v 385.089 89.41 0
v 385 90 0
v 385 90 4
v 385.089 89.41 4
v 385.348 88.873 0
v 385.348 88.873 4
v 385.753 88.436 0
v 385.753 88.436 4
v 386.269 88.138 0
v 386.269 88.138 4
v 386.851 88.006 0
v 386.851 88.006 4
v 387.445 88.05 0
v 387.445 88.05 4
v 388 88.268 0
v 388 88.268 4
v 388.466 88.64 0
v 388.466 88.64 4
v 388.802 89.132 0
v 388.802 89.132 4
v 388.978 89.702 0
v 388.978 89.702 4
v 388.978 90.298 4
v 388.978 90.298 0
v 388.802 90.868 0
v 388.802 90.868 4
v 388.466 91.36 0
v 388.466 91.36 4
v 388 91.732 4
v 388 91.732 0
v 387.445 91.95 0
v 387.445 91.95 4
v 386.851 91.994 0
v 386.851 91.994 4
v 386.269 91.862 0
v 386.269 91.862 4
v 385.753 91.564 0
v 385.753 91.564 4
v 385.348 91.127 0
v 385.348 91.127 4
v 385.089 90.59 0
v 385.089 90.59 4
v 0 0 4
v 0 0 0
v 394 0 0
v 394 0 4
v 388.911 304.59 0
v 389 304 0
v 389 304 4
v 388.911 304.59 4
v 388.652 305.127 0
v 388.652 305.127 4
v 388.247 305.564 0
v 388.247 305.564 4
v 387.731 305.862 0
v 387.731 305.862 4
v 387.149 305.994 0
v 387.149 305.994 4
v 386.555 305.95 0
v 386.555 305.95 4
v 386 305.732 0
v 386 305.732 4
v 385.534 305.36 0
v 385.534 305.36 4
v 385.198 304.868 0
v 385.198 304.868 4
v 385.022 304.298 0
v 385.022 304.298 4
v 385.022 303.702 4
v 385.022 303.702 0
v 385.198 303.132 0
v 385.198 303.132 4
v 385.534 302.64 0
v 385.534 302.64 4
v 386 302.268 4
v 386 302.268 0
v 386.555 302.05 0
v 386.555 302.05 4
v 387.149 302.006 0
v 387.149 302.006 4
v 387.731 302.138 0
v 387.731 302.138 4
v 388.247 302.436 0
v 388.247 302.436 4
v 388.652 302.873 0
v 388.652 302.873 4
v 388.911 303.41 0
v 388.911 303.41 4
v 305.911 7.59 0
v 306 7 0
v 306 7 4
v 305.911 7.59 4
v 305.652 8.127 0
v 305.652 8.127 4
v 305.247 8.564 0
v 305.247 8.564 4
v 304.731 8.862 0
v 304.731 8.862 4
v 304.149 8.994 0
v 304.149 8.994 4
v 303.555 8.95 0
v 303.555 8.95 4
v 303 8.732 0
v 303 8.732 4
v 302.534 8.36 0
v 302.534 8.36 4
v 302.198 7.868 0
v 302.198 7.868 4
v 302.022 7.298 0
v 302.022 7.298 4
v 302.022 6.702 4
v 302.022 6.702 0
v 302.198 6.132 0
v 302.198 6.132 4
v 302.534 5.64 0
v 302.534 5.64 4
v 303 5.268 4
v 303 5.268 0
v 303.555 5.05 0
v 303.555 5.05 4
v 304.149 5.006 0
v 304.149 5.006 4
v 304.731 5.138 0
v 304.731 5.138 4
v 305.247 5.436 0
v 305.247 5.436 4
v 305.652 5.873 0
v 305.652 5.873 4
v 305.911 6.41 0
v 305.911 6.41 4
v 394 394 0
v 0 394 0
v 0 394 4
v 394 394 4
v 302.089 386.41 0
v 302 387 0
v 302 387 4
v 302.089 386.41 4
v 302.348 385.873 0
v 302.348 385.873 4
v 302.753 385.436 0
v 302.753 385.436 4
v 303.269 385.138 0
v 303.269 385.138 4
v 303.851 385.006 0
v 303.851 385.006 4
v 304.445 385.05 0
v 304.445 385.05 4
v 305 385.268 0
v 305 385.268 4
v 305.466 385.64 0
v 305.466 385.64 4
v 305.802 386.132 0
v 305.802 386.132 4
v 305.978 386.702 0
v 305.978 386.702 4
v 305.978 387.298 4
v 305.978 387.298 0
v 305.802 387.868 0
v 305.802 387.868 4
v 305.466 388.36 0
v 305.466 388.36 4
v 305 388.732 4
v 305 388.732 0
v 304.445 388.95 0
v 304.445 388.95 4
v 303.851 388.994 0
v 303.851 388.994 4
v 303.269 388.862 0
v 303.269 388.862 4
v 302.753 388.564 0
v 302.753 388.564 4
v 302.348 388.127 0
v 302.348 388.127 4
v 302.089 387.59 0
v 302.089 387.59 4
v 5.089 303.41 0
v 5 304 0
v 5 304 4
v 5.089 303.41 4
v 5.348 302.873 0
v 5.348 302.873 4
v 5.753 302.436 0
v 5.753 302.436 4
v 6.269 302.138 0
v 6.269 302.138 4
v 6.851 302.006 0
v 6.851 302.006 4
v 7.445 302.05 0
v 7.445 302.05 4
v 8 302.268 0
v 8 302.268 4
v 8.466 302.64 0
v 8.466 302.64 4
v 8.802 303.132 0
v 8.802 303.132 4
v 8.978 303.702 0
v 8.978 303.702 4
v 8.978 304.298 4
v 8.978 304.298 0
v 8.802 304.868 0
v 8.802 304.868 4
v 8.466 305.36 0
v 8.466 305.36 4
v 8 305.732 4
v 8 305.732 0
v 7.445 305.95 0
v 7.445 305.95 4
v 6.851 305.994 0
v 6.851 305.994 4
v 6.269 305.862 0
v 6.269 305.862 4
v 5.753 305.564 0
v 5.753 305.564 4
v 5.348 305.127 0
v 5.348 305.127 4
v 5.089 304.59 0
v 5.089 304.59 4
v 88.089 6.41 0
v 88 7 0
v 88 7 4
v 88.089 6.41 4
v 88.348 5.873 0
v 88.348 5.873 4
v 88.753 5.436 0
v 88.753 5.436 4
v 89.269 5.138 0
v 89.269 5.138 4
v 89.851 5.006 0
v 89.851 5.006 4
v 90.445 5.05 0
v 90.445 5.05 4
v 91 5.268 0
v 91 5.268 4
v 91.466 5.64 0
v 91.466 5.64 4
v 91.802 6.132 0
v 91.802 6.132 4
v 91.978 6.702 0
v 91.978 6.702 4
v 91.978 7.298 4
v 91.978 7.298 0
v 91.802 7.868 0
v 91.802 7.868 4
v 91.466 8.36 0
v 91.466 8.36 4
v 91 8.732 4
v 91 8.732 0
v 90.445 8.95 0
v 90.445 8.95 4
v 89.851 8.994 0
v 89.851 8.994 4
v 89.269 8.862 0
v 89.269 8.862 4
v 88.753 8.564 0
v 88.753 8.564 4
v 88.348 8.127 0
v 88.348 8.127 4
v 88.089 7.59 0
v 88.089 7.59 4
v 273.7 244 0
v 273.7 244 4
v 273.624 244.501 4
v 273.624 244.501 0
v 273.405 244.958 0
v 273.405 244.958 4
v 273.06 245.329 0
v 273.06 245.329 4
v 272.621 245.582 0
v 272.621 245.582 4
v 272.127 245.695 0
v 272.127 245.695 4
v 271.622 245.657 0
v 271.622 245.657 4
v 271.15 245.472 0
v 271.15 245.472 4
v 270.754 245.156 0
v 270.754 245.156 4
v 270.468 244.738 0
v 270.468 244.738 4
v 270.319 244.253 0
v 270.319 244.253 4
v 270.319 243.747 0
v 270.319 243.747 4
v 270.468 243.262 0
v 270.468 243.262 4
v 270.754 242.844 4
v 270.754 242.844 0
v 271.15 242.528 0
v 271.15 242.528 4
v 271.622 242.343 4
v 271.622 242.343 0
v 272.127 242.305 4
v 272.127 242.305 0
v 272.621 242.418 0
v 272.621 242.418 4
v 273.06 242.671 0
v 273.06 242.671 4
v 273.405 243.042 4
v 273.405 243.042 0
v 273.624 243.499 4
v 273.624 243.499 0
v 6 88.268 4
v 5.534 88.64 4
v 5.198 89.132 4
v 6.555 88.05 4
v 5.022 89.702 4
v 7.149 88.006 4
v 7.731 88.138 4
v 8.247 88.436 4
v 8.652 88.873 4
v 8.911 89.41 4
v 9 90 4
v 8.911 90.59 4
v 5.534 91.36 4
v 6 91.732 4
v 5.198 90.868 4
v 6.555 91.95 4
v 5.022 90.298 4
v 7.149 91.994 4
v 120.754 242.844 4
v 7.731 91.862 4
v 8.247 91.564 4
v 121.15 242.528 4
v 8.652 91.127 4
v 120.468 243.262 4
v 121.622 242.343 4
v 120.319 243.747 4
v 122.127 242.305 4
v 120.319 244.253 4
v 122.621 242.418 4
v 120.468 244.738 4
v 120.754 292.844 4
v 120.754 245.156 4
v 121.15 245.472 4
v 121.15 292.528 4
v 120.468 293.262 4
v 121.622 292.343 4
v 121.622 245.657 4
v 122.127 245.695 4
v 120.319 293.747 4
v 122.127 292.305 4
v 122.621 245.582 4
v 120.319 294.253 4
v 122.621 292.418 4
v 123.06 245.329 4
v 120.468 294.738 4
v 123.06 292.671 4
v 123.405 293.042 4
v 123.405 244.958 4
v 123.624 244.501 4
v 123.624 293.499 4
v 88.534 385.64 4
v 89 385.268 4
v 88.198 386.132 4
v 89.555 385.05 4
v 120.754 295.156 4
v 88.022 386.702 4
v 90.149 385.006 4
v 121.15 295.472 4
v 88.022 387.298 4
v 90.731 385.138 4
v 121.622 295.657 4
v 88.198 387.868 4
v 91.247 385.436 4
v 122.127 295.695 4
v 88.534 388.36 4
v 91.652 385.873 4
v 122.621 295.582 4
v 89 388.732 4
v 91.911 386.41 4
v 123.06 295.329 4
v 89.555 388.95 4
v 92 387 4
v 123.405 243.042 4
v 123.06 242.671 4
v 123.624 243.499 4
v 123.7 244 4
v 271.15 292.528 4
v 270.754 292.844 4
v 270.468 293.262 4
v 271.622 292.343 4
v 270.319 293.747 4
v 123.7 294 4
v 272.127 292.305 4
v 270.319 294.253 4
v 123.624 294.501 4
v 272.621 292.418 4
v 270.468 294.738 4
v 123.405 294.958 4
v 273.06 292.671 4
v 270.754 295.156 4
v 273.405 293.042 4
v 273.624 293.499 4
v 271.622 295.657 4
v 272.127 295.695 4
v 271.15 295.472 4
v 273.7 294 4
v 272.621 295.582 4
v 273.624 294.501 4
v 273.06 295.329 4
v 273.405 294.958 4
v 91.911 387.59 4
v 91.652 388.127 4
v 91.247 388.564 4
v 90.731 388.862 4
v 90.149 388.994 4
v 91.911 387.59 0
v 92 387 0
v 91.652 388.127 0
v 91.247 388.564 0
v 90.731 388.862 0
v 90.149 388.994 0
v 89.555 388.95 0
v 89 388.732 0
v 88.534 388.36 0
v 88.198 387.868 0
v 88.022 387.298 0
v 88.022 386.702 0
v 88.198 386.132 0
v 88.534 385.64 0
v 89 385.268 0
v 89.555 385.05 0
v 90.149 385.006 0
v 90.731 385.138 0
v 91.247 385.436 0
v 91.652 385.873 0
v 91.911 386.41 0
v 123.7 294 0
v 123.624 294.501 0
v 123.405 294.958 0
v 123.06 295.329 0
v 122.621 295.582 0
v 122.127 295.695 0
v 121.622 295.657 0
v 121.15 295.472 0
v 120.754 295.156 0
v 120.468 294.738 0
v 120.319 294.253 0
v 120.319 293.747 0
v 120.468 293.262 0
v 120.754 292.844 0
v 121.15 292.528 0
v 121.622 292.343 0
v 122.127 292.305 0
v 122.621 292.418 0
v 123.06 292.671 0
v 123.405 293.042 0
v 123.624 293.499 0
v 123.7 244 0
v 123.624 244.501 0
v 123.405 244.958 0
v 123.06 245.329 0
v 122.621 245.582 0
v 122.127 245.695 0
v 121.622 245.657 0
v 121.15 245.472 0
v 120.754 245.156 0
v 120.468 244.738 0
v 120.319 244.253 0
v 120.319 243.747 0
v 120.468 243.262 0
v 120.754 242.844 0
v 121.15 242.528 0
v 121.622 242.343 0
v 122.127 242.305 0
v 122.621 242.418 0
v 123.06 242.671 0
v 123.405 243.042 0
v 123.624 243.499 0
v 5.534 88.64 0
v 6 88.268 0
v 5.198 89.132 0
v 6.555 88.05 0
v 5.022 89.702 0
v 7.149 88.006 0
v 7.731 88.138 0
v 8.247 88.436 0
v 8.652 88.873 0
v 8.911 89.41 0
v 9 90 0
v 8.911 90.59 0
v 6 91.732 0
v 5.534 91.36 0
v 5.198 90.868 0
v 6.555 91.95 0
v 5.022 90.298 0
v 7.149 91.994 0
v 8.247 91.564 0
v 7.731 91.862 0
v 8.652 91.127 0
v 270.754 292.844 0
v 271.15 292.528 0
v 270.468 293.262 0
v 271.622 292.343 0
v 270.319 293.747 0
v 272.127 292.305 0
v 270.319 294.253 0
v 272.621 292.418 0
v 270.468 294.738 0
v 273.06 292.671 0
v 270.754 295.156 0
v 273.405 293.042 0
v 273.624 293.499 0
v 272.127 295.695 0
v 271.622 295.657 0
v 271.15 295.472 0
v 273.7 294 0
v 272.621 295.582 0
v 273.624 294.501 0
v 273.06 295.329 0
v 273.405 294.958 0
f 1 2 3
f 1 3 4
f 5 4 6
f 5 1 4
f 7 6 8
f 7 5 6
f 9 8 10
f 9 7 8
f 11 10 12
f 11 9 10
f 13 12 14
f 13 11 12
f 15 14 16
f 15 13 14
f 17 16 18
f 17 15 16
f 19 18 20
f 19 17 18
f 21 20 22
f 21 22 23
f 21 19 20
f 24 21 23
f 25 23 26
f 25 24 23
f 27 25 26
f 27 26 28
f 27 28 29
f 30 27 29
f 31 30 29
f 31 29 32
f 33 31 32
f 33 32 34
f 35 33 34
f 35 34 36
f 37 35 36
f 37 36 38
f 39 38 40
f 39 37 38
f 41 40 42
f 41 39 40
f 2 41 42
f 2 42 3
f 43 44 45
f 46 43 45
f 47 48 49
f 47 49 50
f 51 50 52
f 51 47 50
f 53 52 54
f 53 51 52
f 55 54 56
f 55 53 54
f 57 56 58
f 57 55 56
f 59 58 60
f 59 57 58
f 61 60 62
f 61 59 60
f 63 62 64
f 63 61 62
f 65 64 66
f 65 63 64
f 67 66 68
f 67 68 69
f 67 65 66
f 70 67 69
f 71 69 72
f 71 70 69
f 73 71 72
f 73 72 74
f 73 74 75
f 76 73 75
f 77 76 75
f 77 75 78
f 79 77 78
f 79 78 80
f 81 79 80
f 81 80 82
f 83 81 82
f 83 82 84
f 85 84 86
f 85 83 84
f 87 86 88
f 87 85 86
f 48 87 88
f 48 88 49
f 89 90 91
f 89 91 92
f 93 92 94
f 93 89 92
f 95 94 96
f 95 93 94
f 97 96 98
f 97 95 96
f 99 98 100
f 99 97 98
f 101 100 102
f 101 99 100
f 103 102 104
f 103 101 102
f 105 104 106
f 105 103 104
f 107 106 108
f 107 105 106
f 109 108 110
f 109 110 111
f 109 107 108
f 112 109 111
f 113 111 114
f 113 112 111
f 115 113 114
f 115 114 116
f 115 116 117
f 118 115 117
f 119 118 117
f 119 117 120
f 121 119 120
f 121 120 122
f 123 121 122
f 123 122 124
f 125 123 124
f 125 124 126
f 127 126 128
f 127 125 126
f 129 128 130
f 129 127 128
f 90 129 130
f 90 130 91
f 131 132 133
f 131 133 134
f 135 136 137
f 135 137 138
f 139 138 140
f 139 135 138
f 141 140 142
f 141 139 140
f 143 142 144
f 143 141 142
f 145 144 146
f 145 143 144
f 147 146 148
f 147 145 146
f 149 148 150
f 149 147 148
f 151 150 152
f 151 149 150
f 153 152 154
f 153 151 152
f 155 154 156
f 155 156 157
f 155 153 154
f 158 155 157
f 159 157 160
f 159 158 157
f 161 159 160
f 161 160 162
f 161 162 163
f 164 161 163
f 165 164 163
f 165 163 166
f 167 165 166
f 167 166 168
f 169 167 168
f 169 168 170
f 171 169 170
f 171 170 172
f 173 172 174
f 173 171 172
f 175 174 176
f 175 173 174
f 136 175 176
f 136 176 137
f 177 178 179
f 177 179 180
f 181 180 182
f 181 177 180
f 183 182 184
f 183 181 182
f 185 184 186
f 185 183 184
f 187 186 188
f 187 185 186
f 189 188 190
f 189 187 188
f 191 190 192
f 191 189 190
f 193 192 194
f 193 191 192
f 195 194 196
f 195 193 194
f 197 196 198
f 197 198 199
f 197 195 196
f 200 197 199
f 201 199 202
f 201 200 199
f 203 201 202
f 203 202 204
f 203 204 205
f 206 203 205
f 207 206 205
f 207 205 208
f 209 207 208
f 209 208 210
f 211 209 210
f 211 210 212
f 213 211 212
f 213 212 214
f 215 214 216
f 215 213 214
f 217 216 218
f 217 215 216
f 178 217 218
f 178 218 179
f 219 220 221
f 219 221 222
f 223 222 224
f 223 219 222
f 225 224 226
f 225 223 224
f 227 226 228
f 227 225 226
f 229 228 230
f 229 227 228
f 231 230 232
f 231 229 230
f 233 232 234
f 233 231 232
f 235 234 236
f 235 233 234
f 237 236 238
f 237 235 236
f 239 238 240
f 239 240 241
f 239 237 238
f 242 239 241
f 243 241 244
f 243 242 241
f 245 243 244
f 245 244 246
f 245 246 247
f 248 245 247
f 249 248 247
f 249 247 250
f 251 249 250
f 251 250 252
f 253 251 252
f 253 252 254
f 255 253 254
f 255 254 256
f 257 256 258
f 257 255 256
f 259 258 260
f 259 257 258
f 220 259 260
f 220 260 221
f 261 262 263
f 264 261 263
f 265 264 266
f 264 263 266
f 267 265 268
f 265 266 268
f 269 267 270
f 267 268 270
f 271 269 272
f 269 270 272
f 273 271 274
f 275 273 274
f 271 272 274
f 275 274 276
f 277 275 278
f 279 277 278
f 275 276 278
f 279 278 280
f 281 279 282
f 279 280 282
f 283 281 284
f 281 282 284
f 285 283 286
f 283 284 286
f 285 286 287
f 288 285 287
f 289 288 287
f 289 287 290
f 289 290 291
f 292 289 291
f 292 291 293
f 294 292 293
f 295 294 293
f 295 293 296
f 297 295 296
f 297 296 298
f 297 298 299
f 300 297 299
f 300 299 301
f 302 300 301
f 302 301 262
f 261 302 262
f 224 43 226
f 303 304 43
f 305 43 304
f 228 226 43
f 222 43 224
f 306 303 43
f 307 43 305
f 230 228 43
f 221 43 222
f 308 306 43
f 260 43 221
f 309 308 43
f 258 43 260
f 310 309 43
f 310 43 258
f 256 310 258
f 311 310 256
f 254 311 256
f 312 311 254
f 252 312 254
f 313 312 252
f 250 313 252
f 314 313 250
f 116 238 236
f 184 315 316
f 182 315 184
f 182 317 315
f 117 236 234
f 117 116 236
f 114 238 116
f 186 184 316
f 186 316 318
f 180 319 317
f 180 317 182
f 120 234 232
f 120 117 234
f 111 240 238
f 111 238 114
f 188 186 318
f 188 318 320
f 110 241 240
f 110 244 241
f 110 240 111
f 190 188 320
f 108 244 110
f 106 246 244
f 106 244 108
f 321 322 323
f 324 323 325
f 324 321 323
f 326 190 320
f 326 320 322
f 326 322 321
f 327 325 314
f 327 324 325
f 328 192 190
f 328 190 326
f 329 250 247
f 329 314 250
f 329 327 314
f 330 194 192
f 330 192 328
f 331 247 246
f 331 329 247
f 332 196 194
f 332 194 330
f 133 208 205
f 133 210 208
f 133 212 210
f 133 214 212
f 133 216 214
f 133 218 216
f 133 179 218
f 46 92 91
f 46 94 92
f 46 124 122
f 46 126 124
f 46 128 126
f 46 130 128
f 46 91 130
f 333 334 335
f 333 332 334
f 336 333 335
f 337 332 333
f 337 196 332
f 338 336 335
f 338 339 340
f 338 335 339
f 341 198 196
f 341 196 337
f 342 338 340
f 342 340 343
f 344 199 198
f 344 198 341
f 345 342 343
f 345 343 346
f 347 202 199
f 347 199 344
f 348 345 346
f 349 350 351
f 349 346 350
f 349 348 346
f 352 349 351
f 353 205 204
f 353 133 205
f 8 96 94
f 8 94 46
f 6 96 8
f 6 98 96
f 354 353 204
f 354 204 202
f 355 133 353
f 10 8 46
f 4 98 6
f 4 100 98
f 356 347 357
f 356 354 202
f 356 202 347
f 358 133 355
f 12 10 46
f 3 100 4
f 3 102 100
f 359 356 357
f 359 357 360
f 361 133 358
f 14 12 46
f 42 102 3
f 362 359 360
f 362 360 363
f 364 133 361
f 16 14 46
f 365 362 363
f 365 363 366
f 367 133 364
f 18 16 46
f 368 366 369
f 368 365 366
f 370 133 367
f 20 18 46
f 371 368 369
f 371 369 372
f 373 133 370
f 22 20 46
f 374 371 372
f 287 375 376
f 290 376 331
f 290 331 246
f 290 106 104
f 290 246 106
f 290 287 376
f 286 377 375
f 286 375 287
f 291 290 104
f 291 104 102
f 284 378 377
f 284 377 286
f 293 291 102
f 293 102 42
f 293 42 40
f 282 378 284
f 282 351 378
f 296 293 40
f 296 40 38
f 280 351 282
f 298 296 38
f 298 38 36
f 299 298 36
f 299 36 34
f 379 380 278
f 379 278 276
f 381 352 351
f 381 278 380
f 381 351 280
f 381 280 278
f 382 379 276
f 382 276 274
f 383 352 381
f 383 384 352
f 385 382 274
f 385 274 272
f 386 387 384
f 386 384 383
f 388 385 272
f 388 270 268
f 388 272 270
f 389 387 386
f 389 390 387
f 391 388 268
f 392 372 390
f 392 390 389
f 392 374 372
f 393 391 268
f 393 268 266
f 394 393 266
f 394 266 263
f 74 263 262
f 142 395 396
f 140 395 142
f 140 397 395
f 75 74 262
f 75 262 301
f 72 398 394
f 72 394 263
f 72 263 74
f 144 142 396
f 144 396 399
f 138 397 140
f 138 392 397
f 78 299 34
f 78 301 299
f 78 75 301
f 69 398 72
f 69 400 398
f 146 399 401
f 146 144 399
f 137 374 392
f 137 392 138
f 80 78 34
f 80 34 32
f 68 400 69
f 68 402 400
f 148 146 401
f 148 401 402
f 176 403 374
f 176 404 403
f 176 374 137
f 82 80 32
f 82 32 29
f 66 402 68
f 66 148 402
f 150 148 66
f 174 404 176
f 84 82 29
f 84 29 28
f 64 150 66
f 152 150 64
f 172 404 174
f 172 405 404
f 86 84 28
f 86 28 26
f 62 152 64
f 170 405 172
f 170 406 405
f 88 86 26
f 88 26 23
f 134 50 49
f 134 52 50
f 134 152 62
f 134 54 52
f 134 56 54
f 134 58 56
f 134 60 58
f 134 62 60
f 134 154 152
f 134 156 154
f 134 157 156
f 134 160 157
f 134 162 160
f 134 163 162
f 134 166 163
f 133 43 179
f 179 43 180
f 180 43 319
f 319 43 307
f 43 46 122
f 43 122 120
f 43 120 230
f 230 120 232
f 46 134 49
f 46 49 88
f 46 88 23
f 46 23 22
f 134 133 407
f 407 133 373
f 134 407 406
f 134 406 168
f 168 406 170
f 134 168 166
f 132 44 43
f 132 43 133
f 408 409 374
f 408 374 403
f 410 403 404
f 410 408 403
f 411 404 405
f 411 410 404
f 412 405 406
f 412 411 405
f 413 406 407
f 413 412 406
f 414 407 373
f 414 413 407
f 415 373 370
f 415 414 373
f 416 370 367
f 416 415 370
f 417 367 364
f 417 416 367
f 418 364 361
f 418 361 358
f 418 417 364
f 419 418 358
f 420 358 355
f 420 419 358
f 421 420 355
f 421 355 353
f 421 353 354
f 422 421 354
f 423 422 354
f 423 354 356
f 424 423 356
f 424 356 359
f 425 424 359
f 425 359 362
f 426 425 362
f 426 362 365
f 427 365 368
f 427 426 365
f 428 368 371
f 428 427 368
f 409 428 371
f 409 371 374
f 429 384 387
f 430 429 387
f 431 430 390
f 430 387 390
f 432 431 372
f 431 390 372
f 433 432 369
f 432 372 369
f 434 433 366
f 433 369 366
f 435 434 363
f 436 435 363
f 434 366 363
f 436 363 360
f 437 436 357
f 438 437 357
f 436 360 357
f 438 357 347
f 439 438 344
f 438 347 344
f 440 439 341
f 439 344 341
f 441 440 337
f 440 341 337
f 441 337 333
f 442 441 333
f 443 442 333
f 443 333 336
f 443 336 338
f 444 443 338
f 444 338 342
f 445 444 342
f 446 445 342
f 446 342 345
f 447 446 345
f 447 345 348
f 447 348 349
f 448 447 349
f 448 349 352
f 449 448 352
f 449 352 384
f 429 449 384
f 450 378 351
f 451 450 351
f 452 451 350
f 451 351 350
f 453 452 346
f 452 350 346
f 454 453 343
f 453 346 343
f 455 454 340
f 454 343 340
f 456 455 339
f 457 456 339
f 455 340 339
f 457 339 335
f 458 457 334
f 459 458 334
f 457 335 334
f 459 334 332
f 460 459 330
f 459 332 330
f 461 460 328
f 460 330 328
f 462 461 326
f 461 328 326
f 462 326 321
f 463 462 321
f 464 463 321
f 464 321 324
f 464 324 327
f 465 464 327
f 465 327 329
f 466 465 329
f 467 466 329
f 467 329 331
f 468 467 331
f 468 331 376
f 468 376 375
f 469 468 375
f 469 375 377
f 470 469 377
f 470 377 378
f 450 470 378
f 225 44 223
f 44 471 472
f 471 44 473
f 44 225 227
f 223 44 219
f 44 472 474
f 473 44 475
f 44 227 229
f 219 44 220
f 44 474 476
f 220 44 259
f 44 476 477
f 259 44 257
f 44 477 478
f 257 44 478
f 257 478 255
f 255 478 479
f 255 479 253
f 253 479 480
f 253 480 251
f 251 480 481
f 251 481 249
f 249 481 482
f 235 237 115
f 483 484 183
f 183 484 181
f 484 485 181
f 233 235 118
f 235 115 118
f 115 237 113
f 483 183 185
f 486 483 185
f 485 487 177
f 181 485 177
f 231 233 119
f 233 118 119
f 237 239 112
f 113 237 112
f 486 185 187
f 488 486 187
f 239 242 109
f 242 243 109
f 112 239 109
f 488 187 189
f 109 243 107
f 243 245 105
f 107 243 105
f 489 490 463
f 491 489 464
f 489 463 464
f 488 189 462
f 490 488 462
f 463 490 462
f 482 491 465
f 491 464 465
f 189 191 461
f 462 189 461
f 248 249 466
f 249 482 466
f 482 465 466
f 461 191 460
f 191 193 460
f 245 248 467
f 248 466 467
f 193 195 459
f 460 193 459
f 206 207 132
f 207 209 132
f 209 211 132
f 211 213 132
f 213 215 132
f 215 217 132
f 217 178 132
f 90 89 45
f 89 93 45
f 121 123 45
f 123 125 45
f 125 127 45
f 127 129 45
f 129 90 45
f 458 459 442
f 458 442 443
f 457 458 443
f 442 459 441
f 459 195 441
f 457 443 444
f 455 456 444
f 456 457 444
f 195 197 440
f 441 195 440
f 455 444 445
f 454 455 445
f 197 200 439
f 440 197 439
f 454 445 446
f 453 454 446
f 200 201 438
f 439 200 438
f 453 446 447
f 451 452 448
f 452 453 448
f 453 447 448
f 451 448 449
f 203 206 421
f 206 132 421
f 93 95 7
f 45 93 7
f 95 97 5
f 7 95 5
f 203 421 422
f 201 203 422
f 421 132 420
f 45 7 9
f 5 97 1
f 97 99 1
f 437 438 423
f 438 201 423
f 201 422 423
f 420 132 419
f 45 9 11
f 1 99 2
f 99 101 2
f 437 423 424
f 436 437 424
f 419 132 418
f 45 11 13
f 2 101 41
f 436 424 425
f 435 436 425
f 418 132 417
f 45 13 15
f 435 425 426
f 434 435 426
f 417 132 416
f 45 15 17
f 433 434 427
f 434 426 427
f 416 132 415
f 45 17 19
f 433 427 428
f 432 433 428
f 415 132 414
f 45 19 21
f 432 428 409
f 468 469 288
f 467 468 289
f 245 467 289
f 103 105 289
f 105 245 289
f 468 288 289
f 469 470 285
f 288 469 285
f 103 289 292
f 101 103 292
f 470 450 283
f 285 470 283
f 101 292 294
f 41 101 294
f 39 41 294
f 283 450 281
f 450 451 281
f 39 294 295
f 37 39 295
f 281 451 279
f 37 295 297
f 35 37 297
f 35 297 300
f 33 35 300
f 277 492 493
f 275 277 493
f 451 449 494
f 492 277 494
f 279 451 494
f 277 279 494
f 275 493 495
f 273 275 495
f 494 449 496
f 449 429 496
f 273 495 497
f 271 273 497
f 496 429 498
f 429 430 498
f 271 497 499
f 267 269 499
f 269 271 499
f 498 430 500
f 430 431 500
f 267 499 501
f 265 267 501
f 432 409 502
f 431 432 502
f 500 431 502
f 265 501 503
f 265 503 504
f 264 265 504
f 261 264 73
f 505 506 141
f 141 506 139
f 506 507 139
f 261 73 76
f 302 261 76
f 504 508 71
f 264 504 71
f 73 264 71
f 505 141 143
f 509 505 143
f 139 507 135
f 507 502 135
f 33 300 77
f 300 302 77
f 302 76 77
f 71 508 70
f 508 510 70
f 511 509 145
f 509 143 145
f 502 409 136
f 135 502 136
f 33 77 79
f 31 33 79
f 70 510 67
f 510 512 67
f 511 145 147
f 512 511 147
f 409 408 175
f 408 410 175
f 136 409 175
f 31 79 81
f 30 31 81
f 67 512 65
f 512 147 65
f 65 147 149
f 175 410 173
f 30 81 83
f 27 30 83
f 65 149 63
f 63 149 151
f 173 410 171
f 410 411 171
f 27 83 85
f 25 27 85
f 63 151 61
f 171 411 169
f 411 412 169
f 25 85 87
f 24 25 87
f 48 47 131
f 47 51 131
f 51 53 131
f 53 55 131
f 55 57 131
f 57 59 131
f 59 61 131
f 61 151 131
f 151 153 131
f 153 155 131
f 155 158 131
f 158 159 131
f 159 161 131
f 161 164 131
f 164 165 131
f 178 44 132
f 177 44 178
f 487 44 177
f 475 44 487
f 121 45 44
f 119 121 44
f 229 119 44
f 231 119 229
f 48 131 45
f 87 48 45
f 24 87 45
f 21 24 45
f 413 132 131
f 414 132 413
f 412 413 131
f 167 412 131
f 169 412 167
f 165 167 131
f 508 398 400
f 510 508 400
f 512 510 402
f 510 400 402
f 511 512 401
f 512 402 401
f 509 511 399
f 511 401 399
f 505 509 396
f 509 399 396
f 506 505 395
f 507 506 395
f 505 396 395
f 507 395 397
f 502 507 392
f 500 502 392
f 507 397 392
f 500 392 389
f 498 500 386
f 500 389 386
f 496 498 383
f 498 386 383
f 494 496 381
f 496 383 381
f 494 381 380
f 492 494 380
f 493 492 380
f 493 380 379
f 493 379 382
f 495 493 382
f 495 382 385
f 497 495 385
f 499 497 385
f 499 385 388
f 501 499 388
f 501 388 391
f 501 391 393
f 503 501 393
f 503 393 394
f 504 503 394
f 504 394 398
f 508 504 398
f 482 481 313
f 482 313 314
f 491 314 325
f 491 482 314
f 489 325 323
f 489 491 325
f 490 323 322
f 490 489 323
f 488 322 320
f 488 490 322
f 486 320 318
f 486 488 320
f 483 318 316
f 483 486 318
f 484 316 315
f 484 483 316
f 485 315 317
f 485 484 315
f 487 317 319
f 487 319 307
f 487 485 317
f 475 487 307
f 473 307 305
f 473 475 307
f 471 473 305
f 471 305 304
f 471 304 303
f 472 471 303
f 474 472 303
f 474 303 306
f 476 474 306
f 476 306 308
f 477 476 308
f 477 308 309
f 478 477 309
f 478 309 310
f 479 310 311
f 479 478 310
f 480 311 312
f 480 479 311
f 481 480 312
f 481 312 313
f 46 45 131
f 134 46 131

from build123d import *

# Parameters (mm, degrees)
SCHIZZO1_W                   = 394
SCHIZZO1_H                   = 394
SCHIZZO1_R                   = 2
ESTRUSIONE_ESTRUSIONE1_DEPTH = 4
SCHIZZO2_R                   = 1.7
TAGLIO_ESTRUSIONE1_DEPTH     = 558.214500888


with BuildPart() as part:
    # Schizzo1 → Estrusione-Estrusione1 (new body)
    with BuildSketch(Plane.XY):
        with Locations((197, 197)):
            Rectangle(SCHIZZO1_W, SCHIZZO1_H)
        with Locations((90, 387)):
            Circle(SCHIZZO1_R, mode=Mode.SUBTRACT)
        with Locations(Location((304, 387, 0), (0, 0, 180))):
            Circle(SCHIZZO1_R, mode=Mode.SUBTRACT)
        with Locations((387, 304)):
            Circle(SCHIZZO1_R, mode=Mode.SUBTRACT)
        with Locations(Location((7, 304, 0), (0, 0, 180))):
            Circle(SCHIZZO1_R, mode=Mode.SUBTRACT)
        with Locations(Location((387, 90, 0), (0, 0, 180))):
            Circle(SCHIZZO1_R, mode=Mode.SUBTRACT)
        with Locations((304, 7)):
            Circle(SCHIZZO1_R, mode=Mode.SUBTRACT)
        with Locations(Location((90, 7, 0), (0, 0, 180))):
            Circle(SCHIZZO1_R, mode=Mode.SUBTRACT)
        with Locations((7, 90)):
            Circle(SCHIZZO1_R, mode=Mode.SUBTRACT)
    extrude(amount=ESTRUSIONE_ESTRUSIONE1_DEPTH)

    # Schizzo2 → Taglio-Estrusione1 (cut, through all)
    with BuildSketch(Plane.XY.offset(4)):
        with Locations((122, 294)):
            Circle(SCHIZZO2_R)
        with Locations((122, 244)):
            Circle(SCHIZZO2_R)
        with Locations((272, 294)):
            Circle(SCHIZZO2_R)
        with Locations((272, 244)):
            Circle(SCHIZZO2_R)
    extrude(amount=-TAGLIO_ESTRUSIONE1_DEPTH, mode=Mode.SUBTRACT)


solid = part.part
